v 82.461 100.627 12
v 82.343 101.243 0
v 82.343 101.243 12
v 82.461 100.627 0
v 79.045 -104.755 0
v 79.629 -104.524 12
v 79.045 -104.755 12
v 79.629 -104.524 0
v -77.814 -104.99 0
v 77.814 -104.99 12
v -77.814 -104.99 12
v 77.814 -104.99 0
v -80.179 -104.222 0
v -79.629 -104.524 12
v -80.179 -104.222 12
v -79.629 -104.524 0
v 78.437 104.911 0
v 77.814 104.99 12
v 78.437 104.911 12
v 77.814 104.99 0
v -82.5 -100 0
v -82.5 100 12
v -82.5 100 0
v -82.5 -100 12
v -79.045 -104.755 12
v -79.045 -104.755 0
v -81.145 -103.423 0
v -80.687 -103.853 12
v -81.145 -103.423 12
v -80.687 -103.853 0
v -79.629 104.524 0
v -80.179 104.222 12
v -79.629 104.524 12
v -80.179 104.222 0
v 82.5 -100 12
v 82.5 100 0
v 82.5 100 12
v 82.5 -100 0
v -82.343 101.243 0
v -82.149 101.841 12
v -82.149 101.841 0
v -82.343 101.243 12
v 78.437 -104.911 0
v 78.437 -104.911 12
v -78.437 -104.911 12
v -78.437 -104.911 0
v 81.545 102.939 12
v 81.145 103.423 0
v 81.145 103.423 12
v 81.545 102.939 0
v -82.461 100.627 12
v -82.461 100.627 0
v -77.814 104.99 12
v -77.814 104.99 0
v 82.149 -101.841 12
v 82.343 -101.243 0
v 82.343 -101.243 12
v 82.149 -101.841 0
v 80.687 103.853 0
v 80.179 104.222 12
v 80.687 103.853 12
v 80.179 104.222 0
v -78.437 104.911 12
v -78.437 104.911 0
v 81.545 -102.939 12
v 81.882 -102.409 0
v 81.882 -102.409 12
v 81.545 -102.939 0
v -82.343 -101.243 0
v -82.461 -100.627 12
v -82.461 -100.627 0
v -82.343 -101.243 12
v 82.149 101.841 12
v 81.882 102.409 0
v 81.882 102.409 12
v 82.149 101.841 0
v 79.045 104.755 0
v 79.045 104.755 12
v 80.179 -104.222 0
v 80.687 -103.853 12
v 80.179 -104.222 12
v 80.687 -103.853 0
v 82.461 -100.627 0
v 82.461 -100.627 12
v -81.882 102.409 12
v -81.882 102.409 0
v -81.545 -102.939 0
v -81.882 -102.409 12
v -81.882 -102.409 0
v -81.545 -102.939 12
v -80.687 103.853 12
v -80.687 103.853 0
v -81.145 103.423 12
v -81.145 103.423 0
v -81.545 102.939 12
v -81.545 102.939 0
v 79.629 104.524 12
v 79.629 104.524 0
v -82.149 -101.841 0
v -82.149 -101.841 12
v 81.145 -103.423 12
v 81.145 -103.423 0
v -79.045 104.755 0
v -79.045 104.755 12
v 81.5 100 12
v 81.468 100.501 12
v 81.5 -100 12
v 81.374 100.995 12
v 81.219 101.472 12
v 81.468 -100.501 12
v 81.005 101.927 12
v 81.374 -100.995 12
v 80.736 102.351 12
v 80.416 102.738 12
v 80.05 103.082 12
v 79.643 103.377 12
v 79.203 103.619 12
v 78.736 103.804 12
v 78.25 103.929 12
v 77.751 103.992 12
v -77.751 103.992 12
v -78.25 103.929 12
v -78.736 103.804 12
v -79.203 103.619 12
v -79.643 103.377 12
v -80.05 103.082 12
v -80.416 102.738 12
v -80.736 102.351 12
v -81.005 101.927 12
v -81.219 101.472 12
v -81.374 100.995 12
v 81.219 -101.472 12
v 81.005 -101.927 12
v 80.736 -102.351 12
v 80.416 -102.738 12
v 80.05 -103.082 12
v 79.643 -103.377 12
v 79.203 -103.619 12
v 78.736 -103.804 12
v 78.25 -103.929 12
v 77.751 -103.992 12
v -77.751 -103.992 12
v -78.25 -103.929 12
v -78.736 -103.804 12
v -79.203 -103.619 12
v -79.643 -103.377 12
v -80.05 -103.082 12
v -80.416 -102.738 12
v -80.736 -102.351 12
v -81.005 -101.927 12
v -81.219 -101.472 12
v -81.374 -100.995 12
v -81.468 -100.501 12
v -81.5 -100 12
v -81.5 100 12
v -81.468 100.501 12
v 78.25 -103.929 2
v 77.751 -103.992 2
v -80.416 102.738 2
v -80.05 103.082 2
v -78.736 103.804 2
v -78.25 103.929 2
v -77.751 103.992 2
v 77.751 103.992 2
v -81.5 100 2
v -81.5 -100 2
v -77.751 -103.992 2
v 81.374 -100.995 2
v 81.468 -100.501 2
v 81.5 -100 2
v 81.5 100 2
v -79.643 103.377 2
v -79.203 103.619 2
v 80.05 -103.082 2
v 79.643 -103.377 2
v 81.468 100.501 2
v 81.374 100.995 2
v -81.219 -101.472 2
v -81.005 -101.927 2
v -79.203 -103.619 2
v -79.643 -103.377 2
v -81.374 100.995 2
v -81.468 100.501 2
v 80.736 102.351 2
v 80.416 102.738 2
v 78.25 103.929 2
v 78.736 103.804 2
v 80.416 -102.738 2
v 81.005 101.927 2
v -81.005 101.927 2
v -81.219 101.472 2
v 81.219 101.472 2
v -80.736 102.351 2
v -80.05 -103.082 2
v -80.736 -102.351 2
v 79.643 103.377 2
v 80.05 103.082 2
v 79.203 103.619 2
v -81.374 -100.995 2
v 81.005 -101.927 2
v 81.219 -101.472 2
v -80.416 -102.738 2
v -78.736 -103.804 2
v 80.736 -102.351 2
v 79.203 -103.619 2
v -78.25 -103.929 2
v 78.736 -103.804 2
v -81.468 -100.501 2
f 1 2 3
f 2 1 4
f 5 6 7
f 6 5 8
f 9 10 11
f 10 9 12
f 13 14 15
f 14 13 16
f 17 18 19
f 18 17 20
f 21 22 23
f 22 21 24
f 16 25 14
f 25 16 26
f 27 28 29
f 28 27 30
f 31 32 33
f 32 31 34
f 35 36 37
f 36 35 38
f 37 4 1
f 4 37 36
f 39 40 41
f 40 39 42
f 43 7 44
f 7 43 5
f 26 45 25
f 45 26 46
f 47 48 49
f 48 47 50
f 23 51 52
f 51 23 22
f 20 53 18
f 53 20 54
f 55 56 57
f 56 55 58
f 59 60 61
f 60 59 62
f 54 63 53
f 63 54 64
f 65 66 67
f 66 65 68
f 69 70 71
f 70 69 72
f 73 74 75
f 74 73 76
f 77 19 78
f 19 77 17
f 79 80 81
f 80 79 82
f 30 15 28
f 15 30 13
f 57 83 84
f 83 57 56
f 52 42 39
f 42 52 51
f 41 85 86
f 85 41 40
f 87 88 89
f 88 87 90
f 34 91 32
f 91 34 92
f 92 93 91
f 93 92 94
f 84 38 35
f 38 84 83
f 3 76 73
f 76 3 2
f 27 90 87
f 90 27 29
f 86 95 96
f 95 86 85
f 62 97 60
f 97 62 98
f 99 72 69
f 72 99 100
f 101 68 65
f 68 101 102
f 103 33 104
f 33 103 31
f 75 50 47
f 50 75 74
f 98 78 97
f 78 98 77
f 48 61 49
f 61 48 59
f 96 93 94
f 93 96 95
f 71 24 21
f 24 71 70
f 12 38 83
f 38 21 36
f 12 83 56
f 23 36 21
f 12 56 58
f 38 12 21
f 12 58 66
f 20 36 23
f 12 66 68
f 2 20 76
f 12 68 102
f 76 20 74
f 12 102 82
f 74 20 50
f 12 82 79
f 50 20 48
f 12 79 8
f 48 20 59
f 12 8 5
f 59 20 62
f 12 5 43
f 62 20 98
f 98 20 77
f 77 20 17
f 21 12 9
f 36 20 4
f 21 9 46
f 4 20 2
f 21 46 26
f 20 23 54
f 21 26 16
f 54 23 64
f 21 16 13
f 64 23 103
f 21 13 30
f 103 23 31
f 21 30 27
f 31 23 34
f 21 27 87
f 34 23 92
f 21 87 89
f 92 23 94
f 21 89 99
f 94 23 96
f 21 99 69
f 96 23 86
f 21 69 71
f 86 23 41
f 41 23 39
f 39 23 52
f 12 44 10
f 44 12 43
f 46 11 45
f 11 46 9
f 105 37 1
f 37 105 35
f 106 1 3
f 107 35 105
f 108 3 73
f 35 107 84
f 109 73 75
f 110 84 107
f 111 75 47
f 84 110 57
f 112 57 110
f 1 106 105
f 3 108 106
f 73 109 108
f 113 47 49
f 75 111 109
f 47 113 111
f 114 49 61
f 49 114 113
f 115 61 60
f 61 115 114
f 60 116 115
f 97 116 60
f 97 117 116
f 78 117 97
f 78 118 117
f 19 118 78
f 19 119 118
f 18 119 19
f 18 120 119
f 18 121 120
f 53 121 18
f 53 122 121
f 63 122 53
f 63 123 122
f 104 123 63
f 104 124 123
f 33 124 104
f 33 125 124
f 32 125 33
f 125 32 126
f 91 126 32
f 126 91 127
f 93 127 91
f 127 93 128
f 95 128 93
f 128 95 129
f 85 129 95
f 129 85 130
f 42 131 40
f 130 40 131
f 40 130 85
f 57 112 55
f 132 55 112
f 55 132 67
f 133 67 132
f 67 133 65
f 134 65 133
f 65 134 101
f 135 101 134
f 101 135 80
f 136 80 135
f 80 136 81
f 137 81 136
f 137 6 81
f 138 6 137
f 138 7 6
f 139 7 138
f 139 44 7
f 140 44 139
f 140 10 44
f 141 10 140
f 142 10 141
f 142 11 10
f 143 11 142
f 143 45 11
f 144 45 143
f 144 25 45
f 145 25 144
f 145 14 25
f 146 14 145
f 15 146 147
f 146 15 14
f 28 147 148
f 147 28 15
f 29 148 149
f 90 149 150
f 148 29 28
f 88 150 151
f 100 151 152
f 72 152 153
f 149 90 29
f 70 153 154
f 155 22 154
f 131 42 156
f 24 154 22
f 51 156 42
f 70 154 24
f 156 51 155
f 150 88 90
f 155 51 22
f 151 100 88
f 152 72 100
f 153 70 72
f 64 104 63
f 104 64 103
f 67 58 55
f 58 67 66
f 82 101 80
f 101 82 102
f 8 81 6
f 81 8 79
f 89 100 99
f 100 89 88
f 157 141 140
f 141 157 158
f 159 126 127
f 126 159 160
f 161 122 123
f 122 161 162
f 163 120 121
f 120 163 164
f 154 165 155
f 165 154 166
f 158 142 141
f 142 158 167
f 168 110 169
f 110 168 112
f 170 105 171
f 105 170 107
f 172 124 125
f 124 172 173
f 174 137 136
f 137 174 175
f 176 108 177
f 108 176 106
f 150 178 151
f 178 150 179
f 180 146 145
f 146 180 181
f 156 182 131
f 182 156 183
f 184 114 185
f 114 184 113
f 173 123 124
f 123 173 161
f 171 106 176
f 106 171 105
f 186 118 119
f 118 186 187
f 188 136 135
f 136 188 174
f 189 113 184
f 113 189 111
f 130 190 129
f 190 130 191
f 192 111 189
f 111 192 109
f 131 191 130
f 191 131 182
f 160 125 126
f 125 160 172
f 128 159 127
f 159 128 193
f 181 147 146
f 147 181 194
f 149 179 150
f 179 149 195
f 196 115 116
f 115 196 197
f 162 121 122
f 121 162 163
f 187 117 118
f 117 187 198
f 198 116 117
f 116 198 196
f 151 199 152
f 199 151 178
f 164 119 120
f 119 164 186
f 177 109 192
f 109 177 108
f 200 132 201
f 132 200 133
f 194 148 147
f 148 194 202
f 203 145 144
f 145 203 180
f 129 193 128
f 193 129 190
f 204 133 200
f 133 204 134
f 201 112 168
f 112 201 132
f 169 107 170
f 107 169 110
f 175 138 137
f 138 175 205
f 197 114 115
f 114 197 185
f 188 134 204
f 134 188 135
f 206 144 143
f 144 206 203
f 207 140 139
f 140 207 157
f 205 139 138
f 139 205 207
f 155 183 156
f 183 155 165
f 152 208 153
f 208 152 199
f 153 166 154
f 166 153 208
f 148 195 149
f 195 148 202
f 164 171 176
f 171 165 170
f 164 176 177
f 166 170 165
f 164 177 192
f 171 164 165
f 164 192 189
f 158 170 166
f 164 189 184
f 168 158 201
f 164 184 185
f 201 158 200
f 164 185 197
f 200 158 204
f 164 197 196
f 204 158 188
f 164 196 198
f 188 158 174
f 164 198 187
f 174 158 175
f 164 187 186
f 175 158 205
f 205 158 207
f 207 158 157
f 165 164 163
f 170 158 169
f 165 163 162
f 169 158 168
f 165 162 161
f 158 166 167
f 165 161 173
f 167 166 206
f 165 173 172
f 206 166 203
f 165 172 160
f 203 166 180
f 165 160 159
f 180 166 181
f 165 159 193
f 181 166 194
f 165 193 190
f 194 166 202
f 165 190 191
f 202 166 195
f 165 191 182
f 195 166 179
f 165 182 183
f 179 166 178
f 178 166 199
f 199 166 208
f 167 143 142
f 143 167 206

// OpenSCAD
$fn = 50;


difference() {
	union() {
		hull() {
			translate(v = [-77.5000000000, 100.0000000000, 0]) {
				cylinder(h = 12, r = 5);
			}
			translate(v = [77.5000000000, 100.0000000000, 0]) {
				cylinder(h = 12, r = 5);
			}
			translate(v = [-77.5000000000, -100.0000000000, 0]) {
				cylinder(h = 12, r = 5);
			}
			translate(v = [77.5000000000, -100.0000000000, 0]) {
				cylinder(h = 12, r = 5);
			}
		}
	}
	union() {
		translate(v = [0, 0, 2]) {
			hull() {
				translate(v = [-77.5000000000, 100.0000000000, 0]) {
					cylinder(h = 10, r = 4);
				}
				translate(v = [77.5000000000, 100.0000000000, 0]) {
					cylinder(h = 10, r = 4);
				}
				translate(v = [-77.5000000000, -100.0000000000, 0]) {
					cylinder(h = 10, r = 4);
				}
				translate(v = [77.5000000000, -100.0000000000, 0]) {
					cylinder(h = 10, r = 4);
				}
			}
		}
	}
}
